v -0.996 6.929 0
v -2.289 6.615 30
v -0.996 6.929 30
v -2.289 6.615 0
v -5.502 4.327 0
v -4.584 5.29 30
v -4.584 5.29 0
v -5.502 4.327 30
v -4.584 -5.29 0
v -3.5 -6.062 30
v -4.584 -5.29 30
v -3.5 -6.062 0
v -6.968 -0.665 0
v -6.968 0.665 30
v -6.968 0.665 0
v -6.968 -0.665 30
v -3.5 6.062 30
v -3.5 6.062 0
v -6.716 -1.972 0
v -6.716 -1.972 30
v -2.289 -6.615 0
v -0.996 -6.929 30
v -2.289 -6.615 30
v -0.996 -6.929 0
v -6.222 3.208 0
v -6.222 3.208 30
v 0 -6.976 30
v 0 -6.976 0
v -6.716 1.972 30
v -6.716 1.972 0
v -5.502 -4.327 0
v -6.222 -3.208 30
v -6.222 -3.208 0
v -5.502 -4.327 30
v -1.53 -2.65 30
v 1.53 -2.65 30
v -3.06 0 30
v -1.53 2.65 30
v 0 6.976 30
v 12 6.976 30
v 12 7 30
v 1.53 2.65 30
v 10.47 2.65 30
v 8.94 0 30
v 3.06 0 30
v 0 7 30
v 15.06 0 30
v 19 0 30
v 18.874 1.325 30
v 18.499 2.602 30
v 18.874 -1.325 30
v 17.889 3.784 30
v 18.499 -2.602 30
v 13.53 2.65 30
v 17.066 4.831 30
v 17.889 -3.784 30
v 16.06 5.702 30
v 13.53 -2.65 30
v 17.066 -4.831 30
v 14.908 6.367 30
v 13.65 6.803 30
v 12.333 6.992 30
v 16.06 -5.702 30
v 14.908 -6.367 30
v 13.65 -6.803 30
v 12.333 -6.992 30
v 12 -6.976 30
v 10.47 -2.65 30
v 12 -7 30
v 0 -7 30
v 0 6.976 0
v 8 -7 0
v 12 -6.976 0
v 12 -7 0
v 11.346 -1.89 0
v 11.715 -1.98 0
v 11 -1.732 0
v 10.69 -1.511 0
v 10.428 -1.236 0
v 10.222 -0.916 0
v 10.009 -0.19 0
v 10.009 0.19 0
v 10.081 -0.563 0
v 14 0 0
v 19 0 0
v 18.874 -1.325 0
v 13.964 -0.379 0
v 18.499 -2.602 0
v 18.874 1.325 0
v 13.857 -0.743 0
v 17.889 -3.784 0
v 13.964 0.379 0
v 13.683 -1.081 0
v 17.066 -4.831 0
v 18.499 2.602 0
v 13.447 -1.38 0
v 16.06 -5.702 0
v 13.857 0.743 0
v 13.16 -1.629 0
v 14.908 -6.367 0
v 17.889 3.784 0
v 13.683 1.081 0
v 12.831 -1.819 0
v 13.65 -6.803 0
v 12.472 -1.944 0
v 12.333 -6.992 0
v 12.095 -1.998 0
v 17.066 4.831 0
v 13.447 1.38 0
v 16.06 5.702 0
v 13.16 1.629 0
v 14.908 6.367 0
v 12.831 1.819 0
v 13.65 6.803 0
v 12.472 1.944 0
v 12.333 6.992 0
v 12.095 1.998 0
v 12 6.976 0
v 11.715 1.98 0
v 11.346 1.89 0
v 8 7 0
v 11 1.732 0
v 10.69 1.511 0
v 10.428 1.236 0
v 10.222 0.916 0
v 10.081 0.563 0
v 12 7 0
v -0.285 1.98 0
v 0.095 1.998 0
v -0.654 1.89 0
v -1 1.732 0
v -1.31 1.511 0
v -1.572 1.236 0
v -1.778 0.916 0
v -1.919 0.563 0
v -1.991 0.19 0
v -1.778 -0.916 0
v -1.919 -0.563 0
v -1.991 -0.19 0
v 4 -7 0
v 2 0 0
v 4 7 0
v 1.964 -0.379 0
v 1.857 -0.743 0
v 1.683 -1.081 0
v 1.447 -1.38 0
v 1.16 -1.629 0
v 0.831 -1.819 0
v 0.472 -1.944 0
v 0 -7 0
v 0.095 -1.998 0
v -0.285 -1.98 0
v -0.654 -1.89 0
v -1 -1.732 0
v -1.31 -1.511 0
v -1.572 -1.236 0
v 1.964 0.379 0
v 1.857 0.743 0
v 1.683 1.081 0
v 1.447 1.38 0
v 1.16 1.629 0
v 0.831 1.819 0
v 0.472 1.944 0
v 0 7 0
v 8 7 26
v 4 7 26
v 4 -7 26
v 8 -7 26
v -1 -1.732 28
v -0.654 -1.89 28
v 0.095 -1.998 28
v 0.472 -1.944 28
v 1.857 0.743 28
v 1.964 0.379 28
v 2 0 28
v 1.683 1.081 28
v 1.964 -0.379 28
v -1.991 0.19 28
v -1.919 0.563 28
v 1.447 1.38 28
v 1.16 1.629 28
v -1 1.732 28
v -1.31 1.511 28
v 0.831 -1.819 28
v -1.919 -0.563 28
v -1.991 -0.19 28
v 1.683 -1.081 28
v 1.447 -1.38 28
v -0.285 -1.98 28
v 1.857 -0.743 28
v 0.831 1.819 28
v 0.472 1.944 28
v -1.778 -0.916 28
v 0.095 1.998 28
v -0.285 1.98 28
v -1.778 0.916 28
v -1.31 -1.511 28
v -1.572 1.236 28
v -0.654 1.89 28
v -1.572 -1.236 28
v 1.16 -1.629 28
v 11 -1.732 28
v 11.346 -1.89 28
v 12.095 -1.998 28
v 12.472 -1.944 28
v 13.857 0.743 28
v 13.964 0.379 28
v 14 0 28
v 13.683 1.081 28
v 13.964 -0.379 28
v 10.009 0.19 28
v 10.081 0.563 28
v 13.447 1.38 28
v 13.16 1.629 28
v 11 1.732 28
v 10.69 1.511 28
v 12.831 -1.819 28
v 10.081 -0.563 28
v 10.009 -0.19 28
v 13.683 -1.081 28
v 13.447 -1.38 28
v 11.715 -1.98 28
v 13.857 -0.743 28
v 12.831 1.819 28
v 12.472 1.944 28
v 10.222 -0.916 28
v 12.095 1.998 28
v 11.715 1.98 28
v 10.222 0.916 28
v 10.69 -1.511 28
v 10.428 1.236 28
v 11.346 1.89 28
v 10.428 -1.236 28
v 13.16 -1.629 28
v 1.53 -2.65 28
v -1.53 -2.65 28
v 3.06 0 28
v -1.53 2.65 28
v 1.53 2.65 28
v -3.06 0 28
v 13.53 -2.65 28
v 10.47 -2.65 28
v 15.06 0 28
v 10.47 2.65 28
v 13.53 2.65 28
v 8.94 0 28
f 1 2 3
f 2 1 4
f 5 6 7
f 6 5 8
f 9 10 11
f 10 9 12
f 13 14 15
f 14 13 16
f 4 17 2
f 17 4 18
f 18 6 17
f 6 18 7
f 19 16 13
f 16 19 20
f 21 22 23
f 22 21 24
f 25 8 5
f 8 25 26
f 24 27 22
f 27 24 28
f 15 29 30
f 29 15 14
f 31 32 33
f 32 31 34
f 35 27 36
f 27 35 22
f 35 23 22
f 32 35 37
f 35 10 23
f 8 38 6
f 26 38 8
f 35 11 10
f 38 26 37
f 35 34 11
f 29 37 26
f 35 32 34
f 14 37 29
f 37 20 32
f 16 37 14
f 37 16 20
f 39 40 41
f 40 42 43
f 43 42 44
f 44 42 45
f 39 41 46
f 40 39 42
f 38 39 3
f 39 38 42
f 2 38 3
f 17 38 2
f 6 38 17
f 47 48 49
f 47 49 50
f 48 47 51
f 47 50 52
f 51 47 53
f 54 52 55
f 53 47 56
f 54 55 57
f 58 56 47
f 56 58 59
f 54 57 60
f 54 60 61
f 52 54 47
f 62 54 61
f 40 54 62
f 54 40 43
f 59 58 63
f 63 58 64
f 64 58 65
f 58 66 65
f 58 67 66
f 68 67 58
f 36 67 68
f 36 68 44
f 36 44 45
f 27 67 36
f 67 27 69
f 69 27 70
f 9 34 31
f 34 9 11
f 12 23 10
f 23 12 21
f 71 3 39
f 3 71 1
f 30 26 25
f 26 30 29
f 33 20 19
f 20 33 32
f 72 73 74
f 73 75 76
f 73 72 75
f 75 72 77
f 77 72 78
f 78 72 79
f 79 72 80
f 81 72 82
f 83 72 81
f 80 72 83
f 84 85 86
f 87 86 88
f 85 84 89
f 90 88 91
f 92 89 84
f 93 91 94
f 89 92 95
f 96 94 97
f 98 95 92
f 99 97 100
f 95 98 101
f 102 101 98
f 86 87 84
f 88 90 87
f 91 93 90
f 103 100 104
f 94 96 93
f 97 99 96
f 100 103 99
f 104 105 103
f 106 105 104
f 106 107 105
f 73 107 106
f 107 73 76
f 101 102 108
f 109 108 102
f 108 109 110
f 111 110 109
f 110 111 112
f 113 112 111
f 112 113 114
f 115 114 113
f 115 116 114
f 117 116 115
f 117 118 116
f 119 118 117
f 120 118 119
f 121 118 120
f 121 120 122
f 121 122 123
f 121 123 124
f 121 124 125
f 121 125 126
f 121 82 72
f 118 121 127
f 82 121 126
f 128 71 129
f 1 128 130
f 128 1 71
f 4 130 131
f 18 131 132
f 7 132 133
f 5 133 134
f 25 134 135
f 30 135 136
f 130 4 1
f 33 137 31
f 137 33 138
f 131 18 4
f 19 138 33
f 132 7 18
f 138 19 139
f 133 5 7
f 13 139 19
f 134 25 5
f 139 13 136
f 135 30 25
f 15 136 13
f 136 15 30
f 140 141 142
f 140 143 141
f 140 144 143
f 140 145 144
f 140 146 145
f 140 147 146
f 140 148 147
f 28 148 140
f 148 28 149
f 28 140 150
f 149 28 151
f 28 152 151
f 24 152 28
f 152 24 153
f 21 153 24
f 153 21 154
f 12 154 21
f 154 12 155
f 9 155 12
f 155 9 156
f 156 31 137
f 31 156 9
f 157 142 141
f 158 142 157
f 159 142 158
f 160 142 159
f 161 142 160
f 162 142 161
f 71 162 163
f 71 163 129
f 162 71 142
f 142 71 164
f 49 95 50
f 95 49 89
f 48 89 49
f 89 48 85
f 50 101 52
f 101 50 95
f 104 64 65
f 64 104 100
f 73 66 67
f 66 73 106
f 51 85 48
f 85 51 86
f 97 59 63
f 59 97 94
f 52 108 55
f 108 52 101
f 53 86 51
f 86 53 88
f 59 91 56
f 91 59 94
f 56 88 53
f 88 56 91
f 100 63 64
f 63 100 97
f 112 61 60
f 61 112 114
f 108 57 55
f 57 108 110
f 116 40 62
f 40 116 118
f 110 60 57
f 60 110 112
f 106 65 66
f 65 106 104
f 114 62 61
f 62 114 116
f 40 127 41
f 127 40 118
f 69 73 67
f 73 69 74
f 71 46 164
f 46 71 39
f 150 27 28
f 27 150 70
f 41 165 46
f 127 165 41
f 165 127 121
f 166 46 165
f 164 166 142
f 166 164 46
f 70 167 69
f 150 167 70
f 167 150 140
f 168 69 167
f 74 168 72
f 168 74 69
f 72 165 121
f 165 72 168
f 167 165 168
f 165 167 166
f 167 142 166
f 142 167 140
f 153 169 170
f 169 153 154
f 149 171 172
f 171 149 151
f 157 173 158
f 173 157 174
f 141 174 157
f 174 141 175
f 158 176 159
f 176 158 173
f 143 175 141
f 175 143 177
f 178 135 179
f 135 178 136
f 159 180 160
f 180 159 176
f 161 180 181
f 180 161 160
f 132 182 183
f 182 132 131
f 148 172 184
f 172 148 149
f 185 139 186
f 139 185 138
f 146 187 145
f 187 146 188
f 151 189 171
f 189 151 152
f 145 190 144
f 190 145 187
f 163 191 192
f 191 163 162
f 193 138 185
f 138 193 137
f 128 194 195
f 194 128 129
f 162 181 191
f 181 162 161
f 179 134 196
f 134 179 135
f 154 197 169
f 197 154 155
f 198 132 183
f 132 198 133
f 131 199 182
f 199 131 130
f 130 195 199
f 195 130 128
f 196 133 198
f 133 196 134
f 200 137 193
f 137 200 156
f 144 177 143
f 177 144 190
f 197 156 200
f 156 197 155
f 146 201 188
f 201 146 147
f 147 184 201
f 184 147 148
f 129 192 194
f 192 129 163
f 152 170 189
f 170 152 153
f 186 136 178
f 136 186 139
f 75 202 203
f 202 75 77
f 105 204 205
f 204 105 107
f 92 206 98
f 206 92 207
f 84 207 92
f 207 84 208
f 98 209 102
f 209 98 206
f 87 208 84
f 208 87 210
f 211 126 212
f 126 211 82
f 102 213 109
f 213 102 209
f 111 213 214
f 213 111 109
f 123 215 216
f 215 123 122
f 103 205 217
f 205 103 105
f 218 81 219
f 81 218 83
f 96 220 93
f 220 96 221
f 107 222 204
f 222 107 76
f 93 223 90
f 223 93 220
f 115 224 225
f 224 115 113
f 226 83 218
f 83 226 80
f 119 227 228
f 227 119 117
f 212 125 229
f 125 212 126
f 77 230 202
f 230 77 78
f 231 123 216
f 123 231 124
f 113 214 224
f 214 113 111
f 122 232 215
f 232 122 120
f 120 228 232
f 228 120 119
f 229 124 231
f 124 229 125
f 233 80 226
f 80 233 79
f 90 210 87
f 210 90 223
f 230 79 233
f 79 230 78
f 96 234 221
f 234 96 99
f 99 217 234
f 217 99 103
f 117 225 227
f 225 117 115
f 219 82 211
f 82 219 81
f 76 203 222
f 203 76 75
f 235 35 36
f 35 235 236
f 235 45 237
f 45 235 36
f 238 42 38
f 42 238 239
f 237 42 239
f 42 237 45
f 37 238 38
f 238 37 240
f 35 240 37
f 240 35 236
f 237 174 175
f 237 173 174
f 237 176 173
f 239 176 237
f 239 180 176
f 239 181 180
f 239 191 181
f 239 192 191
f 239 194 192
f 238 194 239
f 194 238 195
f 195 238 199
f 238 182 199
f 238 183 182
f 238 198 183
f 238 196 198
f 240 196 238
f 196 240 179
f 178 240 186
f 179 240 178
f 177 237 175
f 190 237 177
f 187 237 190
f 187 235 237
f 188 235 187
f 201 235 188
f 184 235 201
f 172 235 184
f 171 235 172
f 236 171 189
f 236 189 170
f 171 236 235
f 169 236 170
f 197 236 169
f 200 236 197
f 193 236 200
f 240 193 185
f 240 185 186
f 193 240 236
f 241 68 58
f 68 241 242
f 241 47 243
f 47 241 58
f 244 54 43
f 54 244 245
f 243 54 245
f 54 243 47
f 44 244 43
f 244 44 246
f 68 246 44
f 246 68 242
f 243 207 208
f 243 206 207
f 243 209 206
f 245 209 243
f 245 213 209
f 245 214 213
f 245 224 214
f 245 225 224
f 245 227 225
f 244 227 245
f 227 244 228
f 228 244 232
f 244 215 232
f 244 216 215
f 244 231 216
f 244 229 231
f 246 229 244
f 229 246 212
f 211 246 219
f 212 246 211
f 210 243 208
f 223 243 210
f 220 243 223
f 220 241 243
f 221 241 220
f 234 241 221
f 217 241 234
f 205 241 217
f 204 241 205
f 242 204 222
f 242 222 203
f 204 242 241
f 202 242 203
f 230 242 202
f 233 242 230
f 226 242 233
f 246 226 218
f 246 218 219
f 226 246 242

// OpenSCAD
// file: configuration.scad
// Copyright (C) 2012 t00tie
// Adapto is licensed under the Creative Commons - GNU GPL license.
// http://creativecommons.org/licenses/GPL/2.0/

// Configuration file for Adapto OpenSCAD files

boltOuterRadius=5/2;// outer radius of bolt threads, 5 for M5 bolts
boltLength=60;//bolt length without head (threaded part only)
washerOuterRadius=13/2;// washers that fit the bolts
washerLength=10;// this is large because it is used to make holes for washers

frameX=20;// width of frame parts (alu, wood etc.)
frameY=20;// ditto

boltOffset=frameX/2;// How far in the bolt holes go, may need tweaking if framX!=frameY

smoothRod=8;// diameter of smooth rods


// Copied from 
// PRUSA Mendel  
// Default metric sizes
// GNU GPL v3
// Josef Průša
// josefprusa@me.com
// prusadjs.cz
// http://www.reprap.org/wiki/Prusa_Mendel
// http://github.com/prusajr/PrusaMendel
m3_nut_diameter = 5.3;
m3_nut_diameter_bigger = ((m3_nut_diameter  / 2) / cos (180 / 6))*2;
// main file
// Copyright (C) 2012 t00tie
// After an stl designed by RoTorIT
// Adapto is licensed under the Creative Commons - GNU GPL license.
// http://creativecommons.org/licenses/GPL/2.0/

include <configuration.scad>;

$fn=33; // wild guess
r=14/2; // radius of each leg
h=30; // belt block height
w=26; // biggest width of belt block
gap=4; //width of gap between the legs
holer=4/2; // radius of the holes
nutr=m3_nut_diameter_bigger/2; // radius of nut trap

difference(){
	union(){
		cylinder(r=r, h=h);
		translate([w-2*r, 0, 0]) cylinder(r=r, h=h);
		translate([0, -r, 0]) cube([w-2*r, 2*r, h]);
	}
	translate([(w-2*r)/2-gap/2, -2*r, -1]) cube([gap, 4*r, h+1-gap]);// gap between the legs
	translate([0, 0, -1]) cylinder(r=holer, h=h+2);
	translate([w-2*r, 0, -1]) cylinder(r=holer, h=h+2);
	translate([0, 0, h-2]) cylinder(r=nutr, h=4, $fn=6);
	translate([w-2*r, 0, h-2]) cylinder(r=nutr, h=4, $fn=6);
}
